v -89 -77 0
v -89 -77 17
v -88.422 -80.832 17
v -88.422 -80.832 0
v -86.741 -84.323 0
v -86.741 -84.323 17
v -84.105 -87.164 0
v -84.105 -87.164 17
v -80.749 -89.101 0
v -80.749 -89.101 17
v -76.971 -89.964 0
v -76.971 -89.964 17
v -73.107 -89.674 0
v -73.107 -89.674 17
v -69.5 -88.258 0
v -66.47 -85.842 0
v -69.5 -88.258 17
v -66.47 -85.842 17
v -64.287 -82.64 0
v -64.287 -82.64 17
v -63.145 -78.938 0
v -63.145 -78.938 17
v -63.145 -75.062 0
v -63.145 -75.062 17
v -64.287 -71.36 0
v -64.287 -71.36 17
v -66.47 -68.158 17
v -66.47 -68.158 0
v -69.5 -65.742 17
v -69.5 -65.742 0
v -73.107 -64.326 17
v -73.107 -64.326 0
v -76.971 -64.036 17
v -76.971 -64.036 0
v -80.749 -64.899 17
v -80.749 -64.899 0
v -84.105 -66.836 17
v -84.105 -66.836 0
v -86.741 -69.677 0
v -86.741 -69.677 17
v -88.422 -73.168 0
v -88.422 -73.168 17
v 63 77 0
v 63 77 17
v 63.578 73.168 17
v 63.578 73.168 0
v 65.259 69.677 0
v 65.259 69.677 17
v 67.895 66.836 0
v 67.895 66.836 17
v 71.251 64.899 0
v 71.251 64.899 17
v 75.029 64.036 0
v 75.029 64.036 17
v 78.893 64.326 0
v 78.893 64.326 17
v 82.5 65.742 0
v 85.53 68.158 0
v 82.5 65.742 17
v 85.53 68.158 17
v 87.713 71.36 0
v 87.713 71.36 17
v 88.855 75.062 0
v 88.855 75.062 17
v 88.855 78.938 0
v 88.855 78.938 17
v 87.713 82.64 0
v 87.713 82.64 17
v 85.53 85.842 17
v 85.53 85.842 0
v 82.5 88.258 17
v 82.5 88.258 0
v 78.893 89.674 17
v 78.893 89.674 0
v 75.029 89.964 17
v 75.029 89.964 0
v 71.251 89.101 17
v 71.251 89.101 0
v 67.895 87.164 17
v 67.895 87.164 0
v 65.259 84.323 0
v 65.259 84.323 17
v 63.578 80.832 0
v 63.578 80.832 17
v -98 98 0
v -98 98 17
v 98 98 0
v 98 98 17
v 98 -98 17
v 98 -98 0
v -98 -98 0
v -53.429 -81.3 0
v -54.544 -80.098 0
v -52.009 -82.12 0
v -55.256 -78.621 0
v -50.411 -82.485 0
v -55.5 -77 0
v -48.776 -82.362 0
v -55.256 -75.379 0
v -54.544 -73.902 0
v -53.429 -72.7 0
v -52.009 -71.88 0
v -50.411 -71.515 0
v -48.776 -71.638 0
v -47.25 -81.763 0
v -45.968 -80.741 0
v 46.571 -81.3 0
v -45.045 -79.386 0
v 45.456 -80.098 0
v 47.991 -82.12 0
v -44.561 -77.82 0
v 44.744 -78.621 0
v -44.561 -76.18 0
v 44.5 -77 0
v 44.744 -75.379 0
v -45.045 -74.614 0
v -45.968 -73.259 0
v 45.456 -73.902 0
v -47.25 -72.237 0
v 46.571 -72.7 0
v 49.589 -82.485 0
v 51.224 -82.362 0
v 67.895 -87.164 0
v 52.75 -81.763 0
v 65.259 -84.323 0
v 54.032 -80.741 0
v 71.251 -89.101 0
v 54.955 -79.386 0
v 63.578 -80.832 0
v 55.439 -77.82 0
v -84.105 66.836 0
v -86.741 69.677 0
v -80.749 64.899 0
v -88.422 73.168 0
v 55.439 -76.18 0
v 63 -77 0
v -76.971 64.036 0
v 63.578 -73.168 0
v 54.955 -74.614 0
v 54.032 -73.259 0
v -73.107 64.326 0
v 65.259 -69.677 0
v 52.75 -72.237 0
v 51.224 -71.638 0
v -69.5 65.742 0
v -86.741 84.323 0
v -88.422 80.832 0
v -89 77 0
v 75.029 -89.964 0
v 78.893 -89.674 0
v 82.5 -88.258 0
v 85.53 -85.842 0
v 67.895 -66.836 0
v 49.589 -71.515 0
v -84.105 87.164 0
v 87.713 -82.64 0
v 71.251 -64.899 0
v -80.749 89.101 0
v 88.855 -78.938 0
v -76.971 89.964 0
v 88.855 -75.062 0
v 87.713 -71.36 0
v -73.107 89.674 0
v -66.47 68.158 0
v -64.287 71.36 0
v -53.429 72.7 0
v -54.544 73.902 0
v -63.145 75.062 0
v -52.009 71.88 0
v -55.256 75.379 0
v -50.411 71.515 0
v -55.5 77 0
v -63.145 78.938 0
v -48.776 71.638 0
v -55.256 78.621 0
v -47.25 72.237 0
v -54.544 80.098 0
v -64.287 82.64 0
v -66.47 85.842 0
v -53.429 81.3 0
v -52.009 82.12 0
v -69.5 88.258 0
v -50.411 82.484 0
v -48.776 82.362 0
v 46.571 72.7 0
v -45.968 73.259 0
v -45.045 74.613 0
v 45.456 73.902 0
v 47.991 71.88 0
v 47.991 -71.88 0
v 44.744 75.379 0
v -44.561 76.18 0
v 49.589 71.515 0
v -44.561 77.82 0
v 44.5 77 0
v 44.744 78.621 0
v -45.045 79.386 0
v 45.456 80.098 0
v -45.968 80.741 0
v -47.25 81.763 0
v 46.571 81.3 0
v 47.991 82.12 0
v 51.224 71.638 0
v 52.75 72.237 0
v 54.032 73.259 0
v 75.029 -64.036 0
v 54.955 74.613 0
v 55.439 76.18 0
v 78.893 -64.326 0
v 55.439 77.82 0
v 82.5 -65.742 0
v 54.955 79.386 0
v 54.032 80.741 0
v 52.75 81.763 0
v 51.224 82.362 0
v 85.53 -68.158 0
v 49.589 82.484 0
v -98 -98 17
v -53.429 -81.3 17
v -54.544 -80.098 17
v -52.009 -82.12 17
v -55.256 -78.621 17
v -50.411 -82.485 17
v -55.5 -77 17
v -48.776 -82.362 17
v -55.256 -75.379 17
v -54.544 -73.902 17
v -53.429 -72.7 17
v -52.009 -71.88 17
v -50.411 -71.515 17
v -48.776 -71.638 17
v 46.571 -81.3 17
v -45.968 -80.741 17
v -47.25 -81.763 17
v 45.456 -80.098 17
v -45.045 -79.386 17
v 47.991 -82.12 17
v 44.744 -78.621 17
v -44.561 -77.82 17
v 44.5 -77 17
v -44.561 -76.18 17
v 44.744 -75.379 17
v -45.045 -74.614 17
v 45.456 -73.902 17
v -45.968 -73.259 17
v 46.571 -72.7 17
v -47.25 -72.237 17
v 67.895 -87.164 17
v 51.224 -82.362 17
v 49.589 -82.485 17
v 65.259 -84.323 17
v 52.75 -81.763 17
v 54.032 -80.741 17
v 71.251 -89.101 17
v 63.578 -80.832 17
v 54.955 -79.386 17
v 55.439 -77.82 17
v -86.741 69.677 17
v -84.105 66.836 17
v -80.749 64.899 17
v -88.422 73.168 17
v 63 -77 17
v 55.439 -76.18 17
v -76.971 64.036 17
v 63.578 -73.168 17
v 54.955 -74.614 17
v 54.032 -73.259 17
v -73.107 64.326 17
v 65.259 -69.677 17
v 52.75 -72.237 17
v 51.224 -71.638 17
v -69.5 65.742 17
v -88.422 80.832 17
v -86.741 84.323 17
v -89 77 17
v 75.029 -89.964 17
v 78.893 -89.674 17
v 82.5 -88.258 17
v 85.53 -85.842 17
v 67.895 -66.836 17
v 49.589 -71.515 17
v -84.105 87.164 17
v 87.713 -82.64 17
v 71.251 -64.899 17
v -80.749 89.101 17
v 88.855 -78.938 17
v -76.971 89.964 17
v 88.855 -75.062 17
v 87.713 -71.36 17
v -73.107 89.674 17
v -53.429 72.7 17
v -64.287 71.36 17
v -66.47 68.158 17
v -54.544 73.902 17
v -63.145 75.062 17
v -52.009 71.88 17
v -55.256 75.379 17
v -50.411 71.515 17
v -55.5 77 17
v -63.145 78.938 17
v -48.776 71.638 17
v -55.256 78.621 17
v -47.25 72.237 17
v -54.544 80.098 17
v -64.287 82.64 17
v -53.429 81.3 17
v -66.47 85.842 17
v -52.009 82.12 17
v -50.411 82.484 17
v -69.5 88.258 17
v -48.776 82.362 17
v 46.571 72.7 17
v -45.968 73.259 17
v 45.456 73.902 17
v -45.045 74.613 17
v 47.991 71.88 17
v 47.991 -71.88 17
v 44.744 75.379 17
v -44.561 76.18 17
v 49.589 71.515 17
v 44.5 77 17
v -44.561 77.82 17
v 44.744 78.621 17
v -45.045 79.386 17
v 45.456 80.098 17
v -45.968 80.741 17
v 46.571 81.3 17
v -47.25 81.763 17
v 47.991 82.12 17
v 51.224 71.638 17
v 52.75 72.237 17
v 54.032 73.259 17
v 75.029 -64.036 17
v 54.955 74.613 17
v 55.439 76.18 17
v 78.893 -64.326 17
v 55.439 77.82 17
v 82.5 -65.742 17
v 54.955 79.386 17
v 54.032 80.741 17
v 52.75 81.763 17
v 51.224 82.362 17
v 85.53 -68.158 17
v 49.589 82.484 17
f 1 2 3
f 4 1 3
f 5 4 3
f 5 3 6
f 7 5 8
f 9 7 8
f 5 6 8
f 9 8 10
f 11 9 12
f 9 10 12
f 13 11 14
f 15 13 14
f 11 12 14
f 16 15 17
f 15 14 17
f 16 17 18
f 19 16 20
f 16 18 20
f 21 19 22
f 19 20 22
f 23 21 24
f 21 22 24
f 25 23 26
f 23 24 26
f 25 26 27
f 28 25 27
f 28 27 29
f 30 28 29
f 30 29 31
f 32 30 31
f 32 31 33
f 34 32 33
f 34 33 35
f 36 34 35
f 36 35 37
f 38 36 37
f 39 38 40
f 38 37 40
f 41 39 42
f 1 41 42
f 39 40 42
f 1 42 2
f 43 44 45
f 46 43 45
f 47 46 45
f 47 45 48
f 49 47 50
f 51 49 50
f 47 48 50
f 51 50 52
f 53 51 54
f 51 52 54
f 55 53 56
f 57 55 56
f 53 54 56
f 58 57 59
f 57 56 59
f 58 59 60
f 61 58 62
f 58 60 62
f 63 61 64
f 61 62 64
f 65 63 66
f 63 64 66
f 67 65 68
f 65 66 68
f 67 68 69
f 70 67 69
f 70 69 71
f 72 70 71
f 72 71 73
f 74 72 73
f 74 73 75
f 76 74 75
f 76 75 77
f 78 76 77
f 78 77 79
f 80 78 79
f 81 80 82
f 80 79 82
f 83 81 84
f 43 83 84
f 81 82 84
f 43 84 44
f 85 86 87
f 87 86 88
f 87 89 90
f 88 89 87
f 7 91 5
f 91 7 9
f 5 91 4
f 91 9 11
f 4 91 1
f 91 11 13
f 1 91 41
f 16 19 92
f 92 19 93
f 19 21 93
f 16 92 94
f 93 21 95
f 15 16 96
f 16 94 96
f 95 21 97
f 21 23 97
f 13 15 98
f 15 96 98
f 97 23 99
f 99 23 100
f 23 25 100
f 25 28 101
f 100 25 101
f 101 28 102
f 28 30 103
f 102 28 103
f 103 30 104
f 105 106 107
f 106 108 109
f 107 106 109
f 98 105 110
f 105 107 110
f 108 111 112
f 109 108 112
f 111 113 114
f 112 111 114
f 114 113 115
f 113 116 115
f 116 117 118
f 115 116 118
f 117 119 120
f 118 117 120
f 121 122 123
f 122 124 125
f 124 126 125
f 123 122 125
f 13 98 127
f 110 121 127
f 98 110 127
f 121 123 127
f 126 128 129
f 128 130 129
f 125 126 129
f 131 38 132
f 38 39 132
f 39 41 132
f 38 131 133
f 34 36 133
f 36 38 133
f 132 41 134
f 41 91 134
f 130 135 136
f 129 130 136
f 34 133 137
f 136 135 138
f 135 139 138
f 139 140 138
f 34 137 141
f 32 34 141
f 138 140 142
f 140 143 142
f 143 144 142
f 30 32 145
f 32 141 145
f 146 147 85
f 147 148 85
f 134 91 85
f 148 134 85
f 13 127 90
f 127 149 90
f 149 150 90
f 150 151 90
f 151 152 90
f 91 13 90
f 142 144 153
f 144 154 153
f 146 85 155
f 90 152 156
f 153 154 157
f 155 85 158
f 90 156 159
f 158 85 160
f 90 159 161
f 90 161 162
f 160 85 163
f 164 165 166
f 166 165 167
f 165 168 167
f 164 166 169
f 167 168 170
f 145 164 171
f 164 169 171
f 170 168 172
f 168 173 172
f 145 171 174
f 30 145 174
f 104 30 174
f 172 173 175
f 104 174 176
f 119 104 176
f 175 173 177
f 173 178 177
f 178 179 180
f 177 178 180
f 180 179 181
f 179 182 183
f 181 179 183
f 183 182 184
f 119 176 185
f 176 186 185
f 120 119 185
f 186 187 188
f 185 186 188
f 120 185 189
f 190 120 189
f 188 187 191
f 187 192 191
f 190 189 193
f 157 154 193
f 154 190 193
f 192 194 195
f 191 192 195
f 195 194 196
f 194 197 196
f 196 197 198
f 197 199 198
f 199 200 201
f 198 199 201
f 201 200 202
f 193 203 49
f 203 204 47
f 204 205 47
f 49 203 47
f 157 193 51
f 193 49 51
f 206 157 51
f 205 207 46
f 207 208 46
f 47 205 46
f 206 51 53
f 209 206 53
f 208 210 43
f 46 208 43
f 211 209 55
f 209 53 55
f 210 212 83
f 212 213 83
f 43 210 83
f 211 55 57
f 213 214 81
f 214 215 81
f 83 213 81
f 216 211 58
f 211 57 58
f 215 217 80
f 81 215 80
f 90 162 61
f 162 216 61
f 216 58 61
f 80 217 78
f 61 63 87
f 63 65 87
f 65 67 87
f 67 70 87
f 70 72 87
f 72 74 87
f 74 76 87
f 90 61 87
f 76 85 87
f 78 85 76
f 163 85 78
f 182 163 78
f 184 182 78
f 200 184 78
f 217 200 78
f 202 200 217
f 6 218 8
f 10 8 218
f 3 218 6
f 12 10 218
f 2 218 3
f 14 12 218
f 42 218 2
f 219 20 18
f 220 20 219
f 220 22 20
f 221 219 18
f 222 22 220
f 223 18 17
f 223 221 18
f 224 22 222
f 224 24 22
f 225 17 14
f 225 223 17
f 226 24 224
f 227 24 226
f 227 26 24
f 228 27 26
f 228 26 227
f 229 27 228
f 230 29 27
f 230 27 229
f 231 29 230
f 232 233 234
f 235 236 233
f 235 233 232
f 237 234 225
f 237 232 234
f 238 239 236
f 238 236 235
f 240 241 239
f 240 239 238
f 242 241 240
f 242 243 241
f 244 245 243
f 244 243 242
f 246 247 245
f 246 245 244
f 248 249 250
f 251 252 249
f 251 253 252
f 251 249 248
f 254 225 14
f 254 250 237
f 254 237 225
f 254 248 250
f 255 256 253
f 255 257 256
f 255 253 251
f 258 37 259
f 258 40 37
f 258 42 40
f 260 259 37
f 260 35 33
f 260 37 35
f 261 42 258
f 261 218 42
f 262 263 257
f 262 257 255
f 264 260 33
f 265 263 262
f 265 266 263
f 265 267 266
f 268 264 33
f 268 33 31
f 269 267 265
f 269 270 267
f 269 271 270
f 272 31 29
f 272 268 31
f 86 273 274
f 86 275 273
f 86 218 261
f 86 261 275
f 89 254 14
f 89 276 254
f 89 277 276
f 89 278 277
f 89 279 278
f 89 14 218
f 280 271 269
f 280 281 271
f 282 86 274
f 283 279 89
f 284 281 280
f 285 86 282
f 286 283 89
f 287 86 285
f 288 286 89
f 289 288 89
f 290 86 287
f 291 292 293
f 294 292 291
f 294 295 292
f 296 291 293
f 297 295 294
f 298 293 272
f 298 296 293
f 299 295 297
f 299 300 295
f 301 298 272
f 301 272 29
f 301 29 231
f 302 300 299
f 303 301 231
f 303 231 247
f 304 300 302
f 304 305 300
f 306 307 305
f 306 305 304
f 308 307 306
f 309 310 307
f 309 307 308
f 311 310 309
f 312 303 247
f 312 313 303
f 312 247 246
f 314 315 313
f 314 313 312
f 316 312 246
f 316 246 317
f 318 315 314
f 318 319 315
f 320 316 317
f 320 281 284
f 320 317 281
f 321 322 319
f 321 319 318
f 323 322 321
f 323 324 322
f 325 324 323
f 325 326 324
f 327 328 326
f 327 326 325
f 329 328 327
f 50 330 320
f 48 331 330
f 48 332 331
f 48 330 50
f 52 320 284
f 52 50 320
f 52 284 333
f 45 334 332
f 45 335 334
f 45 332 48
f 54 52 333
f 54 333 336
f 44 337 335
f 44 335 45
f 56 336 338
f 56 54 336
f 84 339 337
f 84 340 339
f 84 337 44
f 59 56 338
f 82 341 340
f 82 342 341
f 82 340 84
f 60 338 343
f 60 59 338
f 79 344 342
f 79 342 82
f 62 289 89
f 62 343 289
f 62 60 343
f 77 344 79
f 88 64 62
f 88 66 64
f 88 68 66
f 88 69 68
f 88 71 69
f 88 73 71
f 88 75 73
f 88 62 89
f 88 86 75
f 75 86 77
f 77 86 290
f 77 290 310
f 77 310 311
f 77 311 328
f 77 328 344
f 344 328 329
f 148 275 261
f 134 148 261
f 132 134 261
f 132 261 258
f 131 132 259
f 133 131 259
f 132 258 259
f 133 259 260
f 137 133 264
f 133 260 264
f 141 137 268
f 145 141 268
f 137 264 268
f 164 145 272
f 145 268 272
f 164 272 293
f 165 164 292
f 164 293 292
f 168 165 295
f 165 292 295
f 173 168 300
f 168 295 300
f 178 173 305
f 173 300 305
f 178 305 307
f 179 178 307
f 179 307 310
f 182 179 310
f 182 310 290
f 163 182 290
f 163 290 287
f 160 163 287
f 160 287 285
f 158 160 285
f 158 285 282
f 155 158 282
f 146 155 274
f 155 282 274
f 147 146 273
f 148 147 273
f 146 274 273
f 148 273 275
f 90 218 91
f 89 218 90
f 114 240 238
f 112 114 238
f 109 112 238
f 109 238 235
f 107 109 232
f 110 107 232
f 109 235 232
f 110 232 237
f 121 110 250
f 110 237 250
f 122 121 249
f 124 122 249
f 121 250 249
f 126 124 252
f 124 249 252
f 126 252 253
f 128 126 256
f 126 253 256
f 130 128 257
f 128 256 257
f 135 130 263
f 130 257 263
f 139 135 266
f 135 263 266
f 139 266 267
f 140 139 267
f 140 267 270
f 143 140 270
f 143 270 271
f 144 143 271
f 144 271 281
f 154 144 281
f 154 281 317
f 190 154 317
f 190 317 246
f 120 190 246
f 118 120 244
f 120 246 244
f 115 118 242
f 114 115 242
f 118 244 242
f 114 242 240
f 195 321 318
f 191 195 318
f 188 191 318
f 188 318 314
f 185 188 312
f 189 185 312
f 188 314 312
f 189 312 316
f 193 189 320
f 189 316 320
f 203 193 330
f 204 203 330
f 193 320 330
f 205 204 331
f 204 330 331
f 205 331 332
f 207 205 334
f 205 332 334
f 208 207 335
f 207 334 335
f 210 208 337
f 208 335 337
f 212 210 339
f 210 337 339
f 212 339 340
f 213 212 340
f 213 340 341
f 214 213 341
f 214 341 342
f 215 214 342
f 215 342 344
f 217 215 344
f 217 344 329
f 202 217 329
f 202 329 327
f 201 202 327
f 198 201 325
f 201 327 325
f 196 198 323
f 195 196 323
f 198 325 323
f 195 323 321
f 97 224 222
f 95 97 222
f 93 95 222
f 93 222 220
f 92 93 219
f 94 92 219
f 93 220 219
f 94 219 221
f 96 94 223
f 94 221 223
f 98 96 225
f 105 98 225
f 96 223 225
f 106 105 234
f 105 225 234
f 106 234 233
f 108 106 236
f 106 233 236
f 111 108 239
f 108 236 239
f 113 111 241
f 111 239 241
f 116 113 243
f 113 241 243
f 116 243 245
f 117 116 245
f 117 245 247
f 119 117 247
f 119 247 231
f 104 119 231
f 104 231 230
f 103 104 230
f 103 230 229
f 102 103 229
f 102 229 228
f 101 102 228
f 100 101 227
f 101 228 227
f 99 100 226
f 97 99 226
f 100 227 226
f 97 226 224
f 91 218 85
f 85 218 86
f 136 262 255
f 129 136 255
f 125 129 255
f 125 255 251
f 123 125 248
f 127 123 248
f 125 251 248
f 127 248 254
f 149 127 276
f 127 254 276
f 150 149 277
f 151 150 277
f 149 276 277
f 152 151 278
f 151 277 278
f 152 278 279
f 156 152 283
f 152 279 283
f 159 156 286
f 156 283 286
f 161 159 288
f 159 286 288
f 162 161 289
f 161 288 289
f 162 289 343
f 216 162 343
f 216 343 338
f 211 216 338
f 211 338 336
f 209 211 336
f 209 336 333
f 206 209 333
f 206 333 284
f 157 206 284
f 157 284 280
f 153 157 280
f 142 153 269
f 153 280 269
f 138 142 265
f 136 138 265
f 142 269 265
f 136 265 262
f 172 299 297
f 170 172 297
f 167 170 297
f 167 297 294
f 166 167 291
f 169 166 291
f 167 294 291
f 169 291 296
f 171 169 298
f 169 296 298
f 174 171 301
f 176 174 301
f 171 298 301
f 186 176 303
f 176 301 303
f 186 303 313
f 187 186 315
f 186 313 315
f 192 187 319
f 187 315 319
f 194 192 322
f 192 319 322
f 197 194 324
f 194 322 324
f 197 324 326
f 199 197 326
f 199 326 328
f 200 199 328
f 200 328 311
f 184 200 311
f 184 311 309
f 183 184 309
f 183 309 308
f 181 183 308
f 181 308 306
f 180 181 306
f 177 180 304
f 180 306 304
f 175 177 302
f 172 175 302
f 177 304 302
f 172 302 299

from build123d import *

# Parameters (mm, degrees)
SKETCH_1_W      = 196
SKETCH_1_H      = 196
SKETCH_1_R      = 5.5
SKETCH_1_R_2    = 5.499997081
SKETCH_1_R_3    = 13
EXTRUDE_1_DEPTH = 17


with BuildPart() as part:
    # Эскиз1 → Бобышка-Вытянуть1 (new body)
    with BuildSketch(Plane.XY.offset(17)):
        Rectangle(SKETCH_1_W, SKETCH_1_H)
        with Locations(Location((-50, -77, 0), (0, 0, 180))):
            Circle(SKETCH_1_R, mode=Mode.SUBTRACT)
        with Locations(Location((-50.000002921, 76.99985459, 0), (0, 0, 180))):
            Circle(SKETCH_1_R_2, mode=Mode.SUBTRACT)
        with Locations(Location((50, -77, 0), (0, 0, 180))):
            Circle(SKETCH_1_R, mode=Mode.SUBTRACT)
        with Locations(Location((49.999997079, 76.99985459, 0), (0, 0, 180))):
            Circle(SKETCH_1_R_2, mode=Mode.SUBTRACT)
        with Locations(Location((-76, 77, 0), (0, 0, 180))):
            Circle(SKETCH_1_R_3, mode=Mode.SUBTRACT)
        with Locations(Location((-76, -77, 0), (0, 0, 180))):
            Circle(SKETCH_1_R_3, mode=Mode.SUBTRACT)
        with Locations(Location((76, -77, 0), (0, 0, 180))):
            Circle(SKETCH_1_R_3, mode=Mode.SUBTRACT)
        with Locations(Location((76, 77, 0), (0, 0, 180))):
            Circle(SKETCH_1_R_3, mode=Mode.SUBTRACT)
    extrude(amount=-EXTRUDE_1_DEPTH)


solid = part.part
